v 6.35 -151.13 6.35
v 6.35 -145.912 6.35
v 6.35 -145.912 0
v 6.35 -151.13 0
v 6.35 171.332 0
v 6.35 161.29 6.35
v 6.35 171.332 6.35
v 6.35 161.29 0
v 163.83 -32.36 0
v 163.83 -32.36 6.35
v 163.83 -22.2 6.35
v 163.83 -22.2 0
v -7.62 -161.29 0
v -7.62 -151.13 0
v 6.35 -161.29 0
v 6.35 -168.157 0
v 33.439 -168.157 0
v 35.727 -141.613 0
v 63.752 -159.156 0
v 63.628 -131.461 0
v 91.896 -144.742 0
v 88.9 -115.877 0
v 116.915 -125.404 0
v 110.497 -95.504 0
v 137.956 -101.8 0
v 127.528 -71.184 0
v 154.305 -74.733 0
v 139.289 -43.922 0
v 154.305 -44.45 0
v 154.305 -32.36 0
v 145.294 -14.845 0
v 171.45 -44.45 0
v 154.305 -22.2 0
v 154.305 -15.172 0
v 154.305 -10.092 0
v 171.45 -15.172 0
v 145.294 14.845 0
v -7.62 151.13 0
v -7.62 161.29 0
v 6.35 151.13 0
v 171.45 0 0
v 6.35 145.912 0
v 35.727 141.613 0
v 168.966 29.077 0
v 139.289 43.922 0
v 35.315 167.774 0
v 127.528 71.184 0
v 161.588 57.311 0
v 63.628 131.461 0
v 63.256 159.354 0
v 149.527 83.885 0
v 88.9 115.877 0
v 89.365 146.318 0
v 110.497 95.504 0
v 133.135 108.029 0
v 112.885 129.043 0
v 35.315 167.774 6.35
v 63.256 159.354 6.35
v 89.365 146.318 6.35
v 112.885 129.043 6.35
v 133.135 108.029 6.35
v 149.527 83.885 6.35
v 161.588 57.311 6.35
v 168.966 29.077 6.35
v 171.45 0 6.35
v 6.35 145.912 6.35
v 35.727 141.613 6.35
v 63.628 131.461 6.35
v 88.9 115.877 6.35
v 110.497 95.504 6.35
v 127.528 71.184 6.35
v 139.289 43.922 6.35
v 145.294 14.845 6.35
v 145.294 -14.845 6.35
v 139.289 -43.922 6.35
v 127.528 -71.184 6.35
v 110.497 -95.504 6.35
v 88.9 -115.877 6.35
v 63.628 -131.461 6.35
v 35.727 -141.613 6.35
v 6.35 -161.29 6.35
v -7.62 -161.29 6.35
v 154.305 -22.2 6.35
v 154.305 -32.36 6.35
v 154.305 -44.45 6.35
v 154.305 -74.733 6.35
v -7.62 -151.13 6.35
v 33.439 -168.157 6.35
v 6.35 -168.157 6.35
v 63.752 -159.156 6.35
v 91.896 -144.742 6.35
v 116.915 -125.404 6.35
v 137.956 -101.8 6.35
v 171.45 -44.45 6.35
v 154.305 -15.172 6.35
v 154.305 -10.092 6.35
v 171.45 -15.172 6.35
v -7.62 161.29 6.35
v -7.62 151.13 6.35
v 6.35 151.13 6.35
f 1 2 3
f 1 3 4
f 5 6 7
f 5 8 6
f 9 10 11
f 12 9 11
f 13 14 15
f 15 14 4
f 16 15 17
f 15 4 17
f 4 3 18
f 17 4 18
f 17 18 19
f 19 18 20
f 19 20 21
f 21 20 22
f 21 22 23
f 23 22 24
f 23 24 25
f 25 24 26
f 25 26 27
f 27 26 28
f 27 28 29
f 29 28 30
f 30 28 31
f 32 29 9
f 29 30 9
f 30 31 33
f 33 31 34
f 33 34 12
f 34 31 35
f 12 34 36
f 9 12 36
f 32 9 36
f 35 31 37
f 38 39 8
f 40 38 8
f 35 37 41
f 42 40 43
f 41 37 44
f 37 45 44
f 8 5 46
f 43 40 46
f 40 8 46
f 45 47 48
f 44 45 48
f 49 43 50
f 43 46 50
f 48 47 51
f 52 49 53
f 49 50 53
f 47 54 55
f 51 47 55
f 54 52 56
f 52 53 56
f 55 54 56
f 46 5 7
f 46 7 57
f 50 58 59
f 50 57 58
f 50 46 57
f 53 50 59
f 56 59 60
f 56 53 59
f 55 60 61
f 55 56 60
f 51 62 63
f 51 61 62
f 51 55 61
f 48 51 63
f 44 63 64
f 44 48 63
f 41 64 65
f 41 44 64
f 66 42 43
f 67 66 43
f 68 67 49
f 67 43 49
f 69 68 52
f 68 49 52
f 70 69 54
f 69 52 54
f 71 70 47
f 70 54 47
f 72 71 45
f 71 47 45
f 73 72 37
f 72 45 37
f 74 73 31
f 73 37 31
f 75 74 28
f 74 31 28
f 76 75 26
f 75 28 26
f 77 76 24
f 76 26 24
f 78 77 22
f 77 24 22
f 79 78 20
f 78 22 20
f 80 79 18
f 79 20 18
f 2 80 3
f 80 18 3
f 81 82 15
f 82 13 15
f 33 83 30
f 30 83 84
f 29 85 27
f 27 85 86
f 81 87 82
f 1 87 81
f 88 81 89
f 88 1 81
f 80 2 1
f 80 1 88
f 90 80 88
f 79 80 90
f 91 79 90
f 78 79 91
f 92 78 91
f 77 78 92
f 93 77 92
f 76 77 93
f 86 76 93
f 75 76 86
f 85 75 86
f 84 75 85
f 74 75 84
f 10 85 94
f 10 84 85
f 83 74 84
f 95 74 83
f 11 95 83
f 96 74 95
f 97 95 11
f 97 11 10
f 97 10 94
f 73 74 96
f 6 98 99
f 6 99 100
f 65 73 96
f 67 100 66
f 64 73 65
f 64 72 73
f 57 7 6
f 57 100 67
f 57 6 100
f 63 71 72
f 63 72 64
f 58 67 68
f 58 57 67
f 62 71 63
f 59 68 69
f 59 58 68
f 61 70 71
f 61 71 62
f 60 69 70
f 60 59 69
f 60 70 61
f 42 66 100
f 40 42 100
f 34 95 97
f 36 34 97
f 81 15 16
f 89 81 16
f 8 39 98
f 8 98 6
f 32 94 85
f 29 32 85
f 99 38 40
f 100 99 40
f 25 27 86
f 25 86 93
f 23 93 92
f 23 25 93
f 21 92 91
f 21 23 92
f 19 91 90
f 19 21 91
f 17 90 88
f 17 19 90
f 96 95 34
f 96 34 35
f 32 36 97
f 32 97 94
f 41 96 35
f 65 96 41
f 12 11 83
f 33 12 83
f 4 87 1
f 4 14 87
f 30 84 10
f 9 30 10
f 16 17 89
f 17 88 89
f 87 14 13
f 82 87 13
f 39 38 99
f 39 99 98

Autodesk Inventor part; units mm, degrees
ref_plane "YZ Plane" through (0, 0, 0) normal (1, 0, 0) x (0, 1, 0)
ref_plane "XZ Plane" through (0, 0, 0) normal (0, 1, 0) x (-1, 0, 0)
ref_plane "XY Plane" through (0, 0, 0) normal (0, 0, 1) x (1, 0, 0)
sketch "Sketch1" plane through (0, 0, 0) normal (0, 0, 1) x (1, 0, 0)
  arc A0 (0, -146.05) -> (0, 146.05) centre (0, 0) ccw
  line L0 (0, 0) -> (0, 226.0912) construction
  line L1 (0, 226.0912) -> (0, -237.3269) construction
  line L2 (6.35, 145.9119) -> (6.35, 171.3324)
  line L3 (6.35, -145.9119) -> (6.35, -171.3324)
  line L4 (0, 146.05) -> (0, 151.13)
  line L5 (0, 151.13) -> (6.35, 151.13)
  line L6 (6.35, 151.13) -> (-7.62, 151.13)
  line L7 (-7.62, 151.13) -> (-7.62, 161.29)
  line L8 (-7.62, 161.29) -> (6.35, 161.29)
  line L9 (0, -146.05) -> (0, -151.13)
  line L10 (0, -151.13) -> (6.35, -151.13)
  line L11 (6.35, -151.13) -> (-7.62, -151.13)
  line L12 (-7.62, -151.13) -> (-7.62, -161.29)
  line L13 (-7.62, -161.29) -> (6.35, -161.29)
  line L14 (171.45, 0) -> (171.45, -69.85)
  line L15 (171.45, -69.85) -> (156.5761, -69.85)
  arc A1 (0, -171.45) -> (156.5761, -69.85) centre (0, 0) ccw
  arc A2 (171.45, 0) -> (0, 171.45) centre (0, 0) ccw
  dimension "d20" = 292.1
  dimension "d21" = 6.35
  dimension "d22" = 6.35
  dimension "d23" = 5.08
  dimension "d24" = 13.97
  dimension "d25" = 10.16
  dimension "d26" = 5.08
  dimension "d27" = 13.97
  dimension "d28" = 10.16
  dimension "d29" = 69.85
  dimension "d45" = 171.45
  dimension "d46" = 171.45
extrude "Extrusion5" add sketch "Sketch1" along normal blind 6.35 contours A0 L2 A2 L14 L15 A1 L3 | L10 L3 L13 L12 L11 | L5 L6 L7 L8 L2
sketch "Sketch3" plane through (0, 0, 6.35) normal (0, 0, 1) x (1, 0, 0)
  arc A0 (6.35, -171.3324) -> (156.5761, -69.85) centre (0, 0) ccw projected
  line L0 (156.5761, -69.85) -> (171.45, -69.85) projected
  line L1 (171.45, -69.85) -> (171.45, 0) projected
  arc A1 (171.45, 0) -> (6.35, 171.3324) centre (0, 0) ccw projected
  line L2 (6.35, 171.3324) -> (6.35, 161.29) projected
  line L3 (154.305, -22.1996) -> (154.305, -32.3596)
  line L4 (154.305, -32.3596) -> (163.83, -32.3596)
  line L5 (163.83, -32.3596) -> (163.83, -22.1996)
  line L6 (163.83, -22.1996) -> (154.305, -22.1996)
  line L7 (154.305, -15.1718) -> (171.45, -15.1718)
  line L8 (171.45, 0) -> (171.45, -15.1718)
  line L9 (154.305, -15.1718) -> (154.305, -10.0918)
  line L10 (154.305, -10.0918) -> (171.45, 0)
  line L11 (171.45, -69.85) -> (171.45, -44.45)
  line L12 (171.45, -44.45) -> (154.305, -44.45)
  line L13 (154.305, -44.45) -> (154.305, -74.7333)
  dimension "d53" = 10.16
  dimension "d54" = 9.525
  dimension "d55" = 10.16
  dimension "d56" = 37.4904
  dimension "d57" = 7.62
  dimension "d58" = 17.145
  dimension "d59" = 5.08
  dimension "d60" = 25.4
extrude "Extrusion7" cut sketch "Sketch3" against normal blind 25.4
sketch "Sketch4" plane through (0, 0, 6.35) normal (0, 0, 1) x (1, 0, 0)
  line L0 (6.35, -161.29) -> (6.35, -171.3324) projected
  arc A0 (6.35, -171.3324) -> (154.305, -74.7333) centre (0, 0) ccw projected
  line L1 (33.4395, -168.1574) -> (6.35, -168.1574)
  dimension "d63" = 3.175
extrude "Extrusion8" cut sketch "Sketch4" against normal blind 25.4
properties part number "MiddleHoop"
